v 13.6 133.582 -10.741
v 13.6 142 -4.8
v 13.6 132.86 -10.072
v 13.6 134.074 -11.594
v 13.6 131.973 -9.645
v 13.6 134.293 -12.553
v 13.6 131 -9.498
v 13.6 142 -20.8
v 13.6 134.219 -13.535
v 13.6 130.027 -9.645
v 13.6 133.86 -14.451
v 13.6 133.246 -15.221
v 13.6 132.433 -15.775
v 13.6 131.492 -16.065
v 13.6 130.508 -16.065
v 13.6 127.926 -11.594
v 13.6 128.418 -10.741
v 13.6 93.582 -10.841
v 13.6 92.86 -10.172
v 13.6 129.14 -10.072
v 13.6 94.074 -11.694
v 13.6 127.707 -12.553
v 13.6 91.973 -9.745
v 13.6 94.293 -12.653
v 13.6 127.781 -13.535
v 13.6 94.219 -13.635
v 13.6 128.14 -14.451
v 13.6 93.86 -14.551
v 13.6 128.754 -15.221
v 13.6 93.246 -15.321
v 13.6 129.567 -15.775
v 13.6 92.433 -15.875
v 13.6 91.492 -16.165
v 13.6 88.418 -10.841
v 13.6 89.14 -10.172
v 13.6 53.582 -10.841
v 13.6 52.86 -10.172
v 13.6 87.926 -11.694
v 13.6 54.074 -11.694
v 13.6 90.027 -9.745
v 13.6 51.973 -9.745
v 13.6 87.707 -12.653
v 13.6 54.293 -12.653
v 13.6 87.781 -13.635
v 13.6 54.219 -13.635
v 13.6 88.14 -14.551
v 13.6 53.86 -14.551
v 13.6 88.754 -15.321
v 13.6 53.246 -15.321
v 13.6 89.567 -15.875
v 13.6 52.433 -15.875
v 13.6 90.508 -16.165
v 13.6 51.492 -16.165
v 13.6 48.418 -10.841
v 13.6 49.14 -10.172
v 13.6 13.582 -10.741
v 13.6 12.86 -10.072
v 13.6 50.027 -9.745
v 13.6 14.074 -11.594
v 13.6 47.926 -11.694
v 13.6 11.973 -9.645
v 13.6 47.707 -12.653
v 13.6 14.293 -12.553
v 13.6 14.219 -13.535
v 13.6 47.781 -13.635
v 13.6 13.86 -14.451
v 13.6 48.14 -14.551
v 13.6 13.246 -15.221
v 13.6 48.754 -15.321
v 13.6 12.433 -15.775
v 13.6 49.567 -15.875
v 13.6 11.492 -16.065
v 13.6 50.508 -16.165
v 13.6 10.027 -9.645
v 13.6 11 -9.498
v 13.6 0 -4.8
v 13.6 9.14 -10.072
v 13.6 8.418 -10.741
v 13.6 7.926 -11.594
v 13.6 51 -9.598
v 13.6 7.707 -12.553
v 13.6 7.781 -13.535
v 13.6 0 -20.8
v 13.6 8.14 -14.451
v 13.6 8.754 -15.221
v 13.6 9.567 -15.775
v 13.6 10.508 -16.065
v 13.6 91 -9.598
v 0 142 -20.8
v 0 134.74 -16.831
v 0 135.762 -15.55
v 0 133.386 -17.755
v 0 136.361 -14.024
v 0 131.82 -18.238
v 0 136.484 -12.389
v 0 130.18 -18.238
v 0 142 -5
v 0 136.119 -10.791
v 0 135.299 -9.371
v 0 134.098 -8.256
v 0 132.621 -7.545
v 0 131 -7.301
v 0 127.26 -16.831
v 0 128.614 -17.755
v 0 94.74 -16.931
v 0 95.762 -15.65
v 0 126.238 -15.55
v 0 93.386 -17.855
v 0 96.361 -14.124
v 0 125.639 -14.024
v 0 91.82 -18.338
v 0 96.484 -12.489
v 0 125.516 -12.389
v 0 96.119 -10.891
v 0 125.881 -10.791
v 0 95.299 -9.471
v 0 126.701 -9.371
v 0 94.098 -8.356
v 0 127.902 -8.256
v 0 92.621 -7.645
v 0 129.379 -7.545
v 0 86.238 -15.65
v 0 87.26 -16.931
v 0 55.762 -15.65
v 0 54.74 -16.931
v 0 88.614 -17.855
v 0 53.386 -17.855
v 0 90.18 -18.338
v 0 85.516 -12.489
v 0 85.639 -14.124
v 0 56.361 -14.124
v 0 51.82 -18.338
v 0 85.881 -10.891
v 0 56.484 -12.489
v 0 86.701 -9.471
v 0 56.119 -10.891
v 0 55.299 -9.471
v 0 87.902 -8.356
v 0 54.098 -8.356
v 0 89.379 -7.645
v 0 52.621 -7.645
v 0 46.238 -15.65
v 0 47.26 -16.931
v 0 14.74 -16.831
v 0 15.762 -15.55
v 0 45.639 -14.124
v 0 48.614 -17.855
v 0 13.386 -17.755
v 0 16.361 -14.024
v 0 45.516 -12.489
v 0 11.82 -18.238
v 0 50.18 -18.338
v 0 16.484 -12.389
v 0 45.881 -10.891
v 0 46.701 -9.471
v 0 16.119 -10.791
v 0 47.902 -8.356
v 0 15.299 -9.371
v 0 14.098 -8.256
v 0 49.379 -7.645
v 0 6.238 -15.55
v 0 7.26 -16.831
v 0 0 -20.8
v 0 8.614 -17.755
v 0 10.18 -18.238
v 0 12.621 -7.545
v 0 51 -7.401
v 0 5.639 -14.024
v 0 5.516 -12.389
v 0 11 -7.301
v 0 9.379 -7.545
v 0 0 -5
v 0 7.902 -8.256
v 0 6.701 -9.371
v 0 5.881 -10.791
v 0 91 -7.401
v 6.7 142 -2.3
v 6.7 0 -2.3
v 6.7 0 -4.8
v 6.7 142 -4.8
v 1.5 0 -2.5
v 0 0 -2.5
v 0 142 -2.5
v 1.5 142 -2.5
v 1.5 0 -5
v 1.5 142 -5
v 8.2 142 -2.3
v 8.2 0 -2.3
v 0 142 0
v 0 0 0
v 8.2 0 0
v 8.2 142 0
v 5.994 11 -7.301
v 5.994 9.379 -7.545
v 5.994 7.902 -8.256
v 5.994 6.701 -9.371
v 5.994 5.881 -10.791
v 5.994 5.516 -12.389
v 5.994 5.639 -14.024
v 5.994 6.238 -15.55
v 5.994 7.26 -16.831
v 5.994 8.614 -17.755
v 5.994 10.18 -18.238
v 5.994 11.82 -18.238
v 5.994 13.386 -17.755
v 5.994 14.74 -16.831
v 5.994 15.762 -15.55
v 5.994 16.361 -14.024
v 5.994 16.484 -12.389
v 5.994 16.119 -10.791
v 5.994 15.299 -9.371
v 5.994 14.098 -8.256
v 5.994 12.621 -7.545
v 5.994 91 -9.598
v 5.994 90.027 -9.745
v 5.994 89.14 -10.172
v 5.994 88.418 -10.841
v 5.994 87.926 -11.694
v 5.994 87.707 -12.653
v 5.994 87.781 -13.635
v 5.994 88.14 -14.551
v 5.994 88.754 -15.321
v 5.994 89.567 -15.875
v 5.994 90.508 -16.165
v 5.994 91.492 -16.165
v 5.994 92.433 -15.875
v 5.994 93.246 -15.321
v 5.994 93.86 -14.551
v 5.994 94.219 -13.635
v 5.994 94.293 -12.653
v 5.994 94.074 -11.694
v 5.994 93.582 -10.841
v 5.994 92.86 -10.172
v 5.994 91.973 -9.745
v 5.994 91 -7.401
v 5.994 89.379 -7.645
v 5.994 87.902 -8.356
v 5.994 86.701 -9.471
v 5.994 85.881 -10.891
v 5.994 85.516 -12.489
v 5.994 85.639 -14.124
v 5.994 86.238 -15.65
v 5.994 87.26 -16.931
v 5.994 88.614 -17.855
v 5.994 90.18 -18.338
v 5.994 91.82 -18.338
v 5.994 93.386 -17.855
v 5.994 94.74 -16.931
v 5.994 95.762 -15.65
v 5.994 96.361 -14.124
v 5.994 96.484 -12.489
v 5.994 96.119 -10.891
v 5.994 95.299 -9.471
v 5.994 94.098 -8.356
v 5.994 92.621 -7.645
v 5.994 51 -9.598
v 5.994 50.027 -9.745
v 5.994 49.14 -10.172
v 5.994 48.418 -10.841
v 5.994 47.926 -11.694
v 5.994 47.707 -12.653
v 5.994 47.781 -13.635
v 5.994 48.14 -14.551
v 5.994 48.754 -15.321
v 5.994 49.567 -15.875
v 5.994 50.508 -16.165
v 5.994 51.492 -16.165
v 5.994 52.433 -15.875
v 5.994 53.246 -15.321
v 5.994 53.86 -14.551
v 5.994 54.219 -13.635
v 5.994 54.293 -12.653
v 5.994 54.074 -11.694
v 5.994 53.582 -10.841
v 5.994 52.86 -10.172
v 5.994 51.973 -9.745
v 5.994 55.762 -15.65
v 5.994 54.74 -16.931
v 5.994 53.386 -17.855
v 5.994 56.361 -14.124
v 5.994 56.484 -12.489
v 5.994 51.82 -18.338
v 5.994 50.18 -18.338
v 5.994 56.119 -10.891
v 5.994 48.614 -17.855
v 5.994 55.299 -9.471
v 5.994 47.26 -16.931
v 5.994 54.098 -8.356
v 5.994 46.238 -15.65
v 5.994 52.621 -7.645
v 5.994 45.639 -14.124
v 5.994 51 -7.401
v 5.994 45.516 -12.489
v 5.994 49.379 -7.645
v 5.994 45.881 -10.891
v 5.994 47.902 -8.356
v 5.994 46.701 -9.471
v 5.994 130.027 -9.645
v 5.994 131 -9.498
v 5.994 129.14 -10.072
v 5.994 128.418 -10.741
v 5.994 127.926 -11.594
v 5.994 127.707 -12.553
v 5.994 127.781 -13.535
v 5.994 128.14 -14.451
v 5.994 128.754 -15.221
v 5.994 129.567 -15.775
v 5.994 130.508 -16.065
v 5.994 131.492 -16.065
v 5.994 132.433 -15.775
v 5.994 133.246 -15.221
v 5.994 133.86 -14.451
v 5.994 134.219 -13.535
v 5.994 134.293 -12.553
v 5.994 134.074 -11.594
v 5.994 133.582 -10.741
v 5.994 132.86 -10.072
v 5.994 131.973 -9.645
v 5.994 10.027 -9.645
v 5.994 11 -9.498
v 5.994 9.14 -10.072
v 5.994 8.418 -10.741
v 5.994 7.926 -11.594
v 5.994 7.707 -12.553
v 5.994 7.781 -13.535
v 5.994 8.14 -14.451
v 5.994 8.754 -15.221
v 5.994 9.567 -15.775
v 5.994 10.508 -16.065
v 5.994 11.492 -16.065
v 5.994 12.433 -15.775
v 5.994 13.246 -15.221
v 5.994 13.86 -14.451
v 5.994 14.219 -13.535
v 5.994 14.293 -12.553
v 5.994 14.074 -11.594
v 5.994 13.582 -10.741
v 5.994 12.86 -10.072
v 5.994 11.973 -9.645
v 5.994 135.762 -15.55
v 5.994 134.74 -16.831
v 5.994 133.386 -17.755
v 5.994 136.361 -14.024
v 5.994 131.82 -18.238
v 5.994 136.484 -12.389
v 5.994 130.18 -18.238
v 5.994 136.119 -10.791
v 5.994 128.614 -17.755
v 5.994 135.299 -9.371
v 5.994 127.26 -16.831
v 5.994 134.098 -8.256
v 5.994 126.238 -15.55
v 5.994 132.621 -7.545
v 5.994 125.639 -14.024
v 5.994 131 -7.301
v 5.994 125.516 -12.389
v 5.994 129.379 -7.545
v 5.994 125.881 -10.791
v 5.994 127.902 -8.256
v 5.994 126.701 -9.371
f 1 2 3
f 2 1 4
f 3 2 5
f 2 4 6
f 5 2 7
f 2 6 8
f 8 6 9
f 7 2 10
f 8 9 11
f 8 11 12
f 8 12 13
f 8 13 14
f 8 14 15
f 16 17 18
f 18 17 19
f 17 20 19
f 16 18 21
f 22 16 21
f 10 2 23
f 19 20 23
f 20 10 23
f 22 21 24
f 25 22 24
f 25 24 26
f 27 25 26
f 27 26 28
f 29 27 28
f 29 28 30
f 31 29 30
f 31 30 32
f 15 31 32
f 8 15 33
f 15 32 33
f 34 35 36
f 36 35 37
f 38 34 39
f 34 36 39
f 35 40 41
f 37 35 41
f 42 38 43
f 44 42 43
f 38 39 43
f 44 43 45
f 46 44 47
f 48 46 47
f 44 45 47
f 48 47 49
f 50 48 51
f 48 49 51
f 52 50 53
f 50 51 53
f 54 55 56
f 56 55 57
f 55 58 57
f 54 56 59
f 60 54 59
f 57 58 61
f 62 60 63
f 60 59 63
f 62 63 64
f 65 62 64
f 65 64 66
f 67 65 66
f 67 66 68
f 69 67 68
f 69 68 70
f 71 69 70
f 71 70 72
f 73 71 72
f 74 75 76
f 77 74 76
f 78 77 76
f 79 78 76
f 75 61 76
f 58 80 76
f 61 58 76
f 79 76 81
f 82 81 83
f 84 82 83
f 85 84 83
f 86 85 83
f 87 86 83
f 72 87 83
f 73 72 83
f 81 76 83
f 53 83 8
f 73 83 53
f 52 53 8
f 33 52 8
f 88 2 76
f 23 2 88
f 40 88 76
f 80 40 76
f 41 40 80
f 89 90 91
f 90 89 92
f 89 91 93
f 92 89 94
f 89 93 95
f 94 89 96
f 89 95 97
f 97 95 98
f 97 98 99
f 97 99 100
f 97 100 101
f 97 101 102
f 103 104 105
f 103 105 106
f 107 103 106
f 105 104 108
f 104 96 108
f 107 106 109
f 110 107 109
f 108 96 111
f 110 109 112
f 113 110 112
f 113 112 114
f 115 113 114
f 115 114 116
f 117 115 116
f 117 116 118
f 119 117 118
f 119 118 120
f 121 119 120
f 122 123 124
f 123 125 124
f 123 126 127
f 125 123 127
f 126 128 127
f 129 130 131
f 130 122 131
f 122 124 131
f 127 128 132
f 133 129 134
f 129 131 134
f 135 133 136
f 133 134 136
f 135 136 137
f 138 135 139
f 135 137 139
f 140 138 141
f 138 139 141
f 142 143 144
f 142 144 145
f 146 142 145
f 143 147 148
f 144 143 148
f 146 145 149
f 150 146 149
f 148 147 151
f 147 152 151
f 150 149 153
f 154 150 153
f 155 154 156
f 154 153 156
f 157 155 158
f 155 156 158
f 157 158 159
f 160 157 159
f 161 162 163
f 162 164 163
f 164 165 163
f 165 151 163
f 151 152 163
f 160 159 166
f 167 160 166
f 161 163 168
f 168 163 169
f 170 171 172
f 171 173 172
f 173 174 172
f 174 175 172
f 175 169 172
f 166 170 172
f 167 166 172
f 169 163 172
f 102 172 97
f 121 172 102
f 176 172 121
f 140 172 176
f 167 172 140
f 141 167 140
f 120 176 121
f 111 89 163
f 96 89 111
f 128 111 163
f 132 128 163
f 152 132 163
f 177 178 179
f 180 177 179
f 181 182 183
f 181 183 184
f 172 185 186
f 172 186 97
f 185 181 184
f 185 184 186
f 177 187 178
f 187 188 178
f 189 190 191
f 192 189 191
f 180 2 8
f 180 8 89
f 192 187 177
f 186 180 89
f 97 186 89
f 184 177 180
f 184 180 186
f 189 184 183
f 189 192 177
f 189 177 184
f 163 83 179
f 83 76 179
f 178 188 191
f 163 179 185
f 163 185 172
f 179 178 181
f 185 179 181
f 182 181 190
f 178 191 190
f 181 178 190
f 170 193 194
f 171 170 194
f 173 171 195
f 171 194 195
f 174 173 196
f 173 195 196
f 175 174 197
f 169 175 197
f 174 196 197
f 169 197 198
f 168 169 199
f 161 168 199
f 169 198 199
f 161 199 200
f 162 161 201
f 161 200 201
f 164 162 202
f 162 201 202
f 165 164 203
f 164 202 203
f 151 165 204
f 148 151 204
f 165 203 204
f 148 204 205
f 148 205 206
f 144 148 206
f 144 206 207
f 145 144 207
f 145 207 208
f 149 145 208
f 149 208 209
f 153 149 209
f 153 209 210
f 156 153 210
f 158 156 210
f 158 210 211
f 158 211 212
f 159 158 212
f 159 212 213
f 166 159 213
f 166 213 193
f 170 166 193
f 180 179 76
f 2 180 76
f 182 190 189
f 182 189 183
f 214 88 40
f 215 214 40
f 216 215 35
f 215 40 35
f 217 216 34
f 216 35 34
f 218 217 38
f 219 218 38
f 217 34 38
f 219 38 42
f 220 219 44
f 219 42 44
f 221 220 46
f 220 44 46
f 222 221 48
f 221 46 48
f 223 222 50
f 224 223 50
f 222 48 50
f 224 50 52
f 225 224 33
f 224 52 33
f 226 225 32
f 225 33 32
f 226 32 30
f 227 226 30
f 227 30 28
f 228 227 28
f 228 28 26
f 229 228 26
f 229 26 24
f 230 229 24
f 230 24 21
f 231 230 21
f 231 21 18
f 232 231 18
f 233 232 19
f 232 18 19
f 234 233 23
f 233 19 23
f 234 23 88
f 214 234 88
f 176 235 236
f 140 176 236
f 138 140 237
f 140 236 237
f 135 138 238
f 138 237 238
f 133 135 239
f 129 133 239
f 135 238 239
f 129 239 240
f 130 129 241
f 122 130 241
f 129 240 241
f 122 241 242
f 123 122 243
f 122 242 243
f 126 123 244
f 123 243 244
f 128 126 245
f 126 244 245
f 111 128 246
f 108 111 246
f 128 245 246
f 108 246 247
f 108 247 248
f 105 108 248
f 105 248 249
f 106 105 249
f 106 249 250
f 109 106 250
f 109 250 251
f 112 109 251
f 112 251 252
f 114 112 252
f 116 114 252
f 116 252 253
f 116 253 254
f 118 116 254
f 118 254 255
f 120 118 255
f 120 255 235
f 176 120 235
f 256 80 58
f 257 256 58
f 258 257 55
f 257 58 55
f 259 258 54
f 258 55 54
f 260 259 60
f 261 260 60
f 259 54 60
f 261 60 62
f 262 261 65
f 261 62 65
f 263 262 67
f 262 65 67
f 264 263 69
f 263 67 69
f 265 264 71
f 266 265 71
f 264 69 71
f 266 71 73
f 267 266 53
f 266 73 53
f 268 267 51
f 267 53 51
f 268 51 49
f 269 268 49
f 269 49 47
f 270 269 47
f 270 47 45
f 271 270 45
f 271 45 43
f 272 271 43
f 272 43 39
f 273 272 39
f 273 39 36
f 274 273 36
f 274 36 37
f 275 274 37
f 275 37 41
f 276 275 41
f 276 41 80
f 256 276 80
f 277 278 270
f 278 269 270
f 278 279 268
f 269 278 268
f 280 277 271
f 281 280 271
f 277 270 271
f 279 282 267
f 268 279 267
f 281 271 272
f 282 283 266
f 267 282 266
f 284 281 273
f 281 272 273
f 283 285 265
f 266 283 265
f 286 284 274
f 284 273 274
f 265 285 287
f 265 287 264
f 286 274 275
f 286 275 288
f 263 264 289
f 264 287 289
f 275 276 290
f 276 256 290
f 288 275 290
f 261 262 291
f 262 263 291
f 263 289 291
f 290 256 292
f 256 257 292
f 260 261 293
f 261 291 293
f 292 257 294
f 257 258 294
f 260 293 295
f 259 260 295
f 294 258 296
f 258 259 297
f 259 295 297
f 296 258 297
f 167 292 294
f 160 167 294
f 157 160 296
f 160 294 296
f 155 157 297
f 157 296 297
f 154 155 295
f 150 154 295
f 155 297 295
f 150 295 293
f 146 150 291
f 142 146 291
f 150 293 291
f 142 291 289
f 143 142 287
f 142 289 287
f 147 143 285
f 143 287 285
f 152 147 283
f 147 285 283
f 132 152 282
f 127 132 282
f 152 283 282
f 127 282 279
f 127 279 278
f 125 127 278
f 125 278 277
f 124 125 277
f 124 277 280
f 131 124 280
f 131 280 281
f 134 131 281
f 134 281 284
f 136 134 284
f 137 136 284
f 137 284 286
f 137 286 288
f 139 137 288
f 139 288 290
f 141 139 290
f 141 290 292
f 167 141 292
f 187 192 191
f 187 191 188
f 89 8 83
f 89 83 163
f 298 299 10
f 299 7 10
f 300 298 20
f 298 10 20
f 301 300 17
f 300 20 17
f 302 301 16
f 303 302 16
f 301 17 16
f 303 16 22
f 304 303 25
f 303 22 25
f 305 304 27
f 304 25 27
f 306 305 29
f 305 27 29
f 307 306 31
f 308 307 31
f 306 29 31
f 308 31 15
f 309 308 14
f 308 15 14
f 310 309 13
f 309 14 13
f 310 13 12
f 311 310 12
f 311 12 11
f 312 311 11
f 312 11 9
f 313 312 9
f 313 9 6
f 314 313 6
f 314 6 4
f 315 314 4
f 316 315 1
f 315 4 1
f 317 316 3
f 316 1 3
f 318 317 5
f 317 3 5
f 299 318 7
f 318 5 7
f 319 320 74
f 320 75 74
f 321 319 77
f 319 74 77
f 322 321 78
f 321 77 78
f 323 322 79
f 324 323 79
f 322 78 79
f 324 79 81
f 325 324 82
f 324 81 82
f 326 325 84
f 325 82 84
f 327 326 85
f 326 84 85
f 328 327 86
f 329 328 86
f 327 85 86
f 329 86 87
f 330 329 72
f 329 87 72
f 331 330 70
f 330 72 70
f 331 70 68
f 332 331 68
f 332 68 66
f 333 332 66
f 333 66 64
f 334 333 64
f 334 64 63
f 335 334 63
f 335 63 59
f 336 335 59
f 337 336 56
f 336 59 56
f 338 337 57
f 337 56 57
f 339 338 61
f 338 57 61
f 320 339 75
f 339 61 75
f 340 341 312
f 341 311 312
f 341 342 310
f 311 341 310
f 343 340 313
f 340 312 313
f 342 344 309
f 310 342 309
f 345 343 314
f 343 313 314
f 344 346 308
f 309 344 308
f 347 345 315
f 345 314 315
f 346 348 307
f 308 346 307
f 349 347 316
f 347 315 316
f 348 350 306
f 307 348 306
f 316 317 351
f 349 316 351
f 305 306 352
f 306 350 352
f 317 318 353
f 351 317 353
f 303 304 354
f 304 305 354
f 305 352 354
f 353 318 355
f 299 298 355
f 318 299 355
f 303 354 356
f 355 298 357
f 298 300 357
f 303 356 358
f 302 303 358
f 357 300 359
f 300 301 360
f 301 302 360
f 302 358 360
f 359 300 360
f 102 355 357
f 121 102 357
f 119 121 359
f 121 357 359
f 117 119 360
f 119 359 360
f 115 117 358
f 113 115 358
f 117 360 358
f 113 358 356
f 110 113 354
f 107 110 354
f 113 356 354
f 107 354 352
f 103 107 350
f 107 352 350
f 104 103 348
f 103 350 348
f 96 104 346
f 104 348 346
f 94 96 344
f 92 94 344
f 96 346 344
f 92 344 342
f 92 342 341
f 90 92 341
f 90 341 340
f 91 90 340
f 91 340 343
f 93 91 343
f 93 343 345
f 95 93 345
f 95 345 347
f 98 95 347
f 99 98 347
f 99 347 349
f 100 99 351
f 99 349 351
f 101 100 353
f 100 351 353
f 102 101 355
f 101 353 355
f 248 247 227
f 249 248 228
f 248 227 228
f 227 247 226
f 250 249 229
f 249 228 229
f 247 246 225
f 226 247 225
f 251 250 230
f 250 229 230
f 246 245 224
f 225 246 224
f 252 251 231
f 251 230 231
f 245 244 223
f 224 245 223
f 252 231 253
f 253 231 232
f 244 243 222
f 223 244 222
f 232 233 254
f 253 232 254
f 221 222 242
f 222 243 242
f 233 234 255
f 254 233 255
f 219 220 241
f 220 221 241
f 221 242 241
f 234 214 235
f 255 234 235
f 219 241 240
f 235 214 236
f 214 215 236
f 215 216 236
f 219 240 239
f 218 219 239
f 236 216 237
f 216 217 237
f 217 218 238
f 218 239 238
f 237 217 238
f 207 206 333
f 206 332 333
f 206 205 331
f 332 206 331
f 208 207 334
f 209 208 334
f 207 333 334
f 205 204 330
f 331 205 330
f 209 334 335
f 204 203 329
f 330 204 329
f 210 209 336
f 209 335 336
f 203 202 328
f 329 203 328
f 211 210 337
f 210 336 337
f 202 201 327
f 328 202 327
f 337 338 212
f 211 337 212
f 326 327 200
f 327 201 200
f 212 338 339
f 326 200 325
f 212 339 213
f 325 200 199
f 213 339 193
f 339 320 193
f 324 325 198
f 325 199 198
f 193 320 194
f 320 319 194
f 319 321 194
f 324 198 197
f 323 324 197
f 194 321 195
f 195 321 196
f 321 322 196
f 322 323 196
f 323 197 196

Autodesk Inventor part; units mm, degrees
ref_plane "YZ Plane" through (0, 0, 0) normal (1, 0, 0) x (0, 1, 0)
ref_plane "XZ Plane" through (0, 0, 0) normal (0, 1, 0) x (-1, 0, 0)
ref_plane "XY Plane" through (0, 0, 0) normal (0, 0, 1) x (1, 0, 0)
sketch "Sketch1" plane through (0, 0, 0) normal (0, 1, 0) x (-1, 0, 0)
  line L0 (0, 0) -> (0, -2.5)
  line L1 (0, 0) -> (-8.2, 0)
  line L2 (-8.2, 0) -> (-8.2, -2.3)
  line L3 (-8.2, -2.3) -> (-6.7, -2.3)
  line L4 (0, -2.5) -> (-1.5, -2.5)
  line L5 (-1.5, -2.5) -> (-1.5, -5)
  line L6 (-6.7, -2.3) -> (-6.7, -4.8)
  line L7 (-6.7, -4.8) -> (-13.6, -4.8)
  line L8 (-13.6, -4.8) -> (-13.6, -20.8)
  line L9 (-1.5, -5) -> (0, -5)
  line L10 (-13.6, -20.8) -> (0, -20.8)
  line L11 (0, -20.8) -> (0, -5)
  dimension "d0" = 2.5
  dimension "d1" = 8.2
  dimension "d2" = 2.3
  dimension "d3" = 1.5
  dimension "d4" = 1.5
  dimension "d5" = 2.5
  dimension "d6" = 2.5
  dimension "d7" = 6.9
  dimension "d8" = 16
extrude "Extrusion1" add sketch "Sketch1" along normal blind 142
sketch "Sketch2" plane through (0, 0, -20.8) normal (-1, 0, 0) x (0, 0, 1)
  line L0 (0, 142) -> (15.8, 142) projected
  line L1 (0, 0) -> (15.8, 0) projected
  point P0 (20.8, 0)
  point P1 (8, 131)
  point P2 (8, 11)
  point P3 (7.9, 51)
  point P4 (7.9, 91)
  dimension "d11" = 11
  dimension "d12" = 11
  dimension "d13" = 40
  dimension "d14" = 40
hole "Hole1" at (0, 131, -12.8) at (0, 11, -12.8) at (0, 51, -12.9) at (0, 91, -12.9) direction (1, 0, 0) diameter 6.604 end through all counterbore diameter 10.9982 counterbore depth 5.9944 clearance for "Socket Head Cap Screw" size "M6" standard "Ansi Metric M Profile"
properties part number "aactuatorHolder" material "ABS Plastic"
